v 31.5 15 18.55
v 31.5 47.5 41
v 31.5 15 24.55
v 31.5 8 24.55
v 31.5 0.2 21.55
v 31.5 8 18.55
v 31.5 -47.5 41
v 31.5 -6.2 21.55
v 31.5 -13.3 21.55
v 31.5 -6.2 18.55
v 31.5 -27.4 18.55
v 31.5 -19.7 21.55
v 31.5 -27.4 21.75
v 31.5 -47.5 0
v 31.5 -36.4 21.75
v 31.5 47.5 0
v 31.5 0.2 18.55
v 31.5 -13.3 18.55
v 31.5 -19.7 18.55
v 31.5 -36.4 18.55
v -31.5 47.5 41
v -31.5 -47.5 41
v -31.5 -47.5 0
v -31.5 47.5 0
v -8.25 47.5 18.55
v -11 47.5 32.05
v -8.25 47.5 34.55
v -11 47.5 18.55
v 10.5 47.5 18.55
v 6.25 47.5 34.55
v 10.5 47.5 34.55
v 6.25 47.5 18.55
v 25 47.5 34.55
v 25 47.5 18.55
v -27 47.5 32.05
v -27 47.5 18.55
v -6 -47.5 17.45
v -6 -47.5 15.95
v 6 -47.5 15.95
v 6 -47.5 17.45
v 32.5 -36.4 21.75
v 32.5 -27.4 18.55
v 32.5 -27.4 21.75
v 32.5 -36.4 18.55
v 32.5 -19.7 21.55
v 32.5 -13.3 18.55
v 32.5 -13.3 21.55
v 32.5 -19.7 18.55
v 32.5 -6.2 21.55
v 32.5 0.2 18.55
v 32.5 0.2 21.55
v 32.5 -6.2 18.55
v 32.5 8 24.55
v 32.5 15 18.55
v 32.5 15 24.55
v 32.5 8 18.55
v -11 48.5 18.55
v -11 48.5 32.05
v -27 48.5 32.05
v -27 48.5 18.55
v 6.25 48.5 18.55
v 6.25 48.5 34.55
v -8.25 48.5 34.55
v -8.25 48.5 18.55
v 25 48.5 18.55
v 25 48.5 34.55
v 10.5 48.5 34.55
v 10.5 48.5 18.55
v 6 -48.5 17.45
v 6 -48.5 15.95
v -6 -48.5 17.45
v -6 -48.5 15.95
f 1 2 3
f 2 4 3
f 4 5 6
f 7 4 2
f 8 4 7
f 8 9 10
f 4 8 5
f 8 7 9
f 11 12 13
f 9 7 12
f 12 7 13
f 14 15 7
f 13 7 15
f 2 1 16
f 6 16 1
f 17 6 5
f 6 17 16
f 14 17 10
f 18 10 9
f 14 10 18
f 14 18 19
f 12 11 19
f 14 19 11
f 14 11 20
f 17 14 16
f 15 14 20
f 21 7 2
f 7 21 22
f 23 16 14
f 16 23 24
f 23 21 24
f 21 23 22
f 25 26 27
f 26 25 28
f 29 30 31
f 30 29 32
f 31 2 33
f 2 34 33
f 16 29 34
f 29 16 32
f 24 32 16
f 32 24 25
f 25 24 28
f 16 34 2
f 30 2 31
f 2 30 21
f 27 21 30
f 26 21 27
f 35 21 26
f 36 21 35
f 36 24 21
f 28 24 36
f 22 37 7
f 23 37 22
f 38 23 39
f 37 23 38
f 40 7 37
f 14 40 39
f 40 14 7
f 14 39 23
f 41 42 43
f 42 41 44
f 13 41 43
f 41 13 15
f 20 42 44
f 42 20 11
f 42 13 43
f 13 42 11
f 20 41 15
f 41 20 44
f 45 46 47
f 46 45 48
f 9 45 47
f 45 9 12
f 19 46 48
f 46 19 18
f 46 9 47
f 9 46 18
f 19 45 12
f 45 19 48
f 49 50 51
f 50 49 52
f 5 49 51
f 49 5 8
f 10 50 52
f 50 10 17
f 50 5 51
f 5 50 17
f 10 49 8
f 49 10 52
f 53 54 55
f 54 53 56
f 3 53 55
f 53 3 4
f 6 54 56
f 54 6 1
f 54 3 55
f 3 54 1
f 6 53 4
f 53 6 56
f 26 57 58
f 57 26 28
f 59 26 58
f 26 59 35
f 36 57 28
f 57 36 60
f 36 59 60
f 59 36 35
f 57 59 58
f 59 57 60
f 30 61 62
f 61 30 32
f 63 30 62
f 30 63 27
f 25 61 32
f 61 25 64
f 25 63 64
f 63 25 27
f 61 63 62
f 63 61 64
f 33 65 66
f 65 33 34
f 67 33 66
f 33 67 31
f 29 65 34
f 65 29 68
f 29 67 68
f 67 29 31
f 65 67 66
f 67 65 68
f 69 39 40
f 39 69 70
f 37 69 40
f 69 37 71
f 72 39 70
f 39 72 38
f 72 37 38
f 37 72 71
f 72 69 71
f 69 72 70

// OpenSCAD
module raspi_ssd() {
    translate([0,0,37.5]) {
        // Base volume (rounded corners, r=10)
        color("darkgray")
        cube([94,114,69], center=true);

        // Front Panel I/O
        color("green")
        translate([-94/2 - 0.5, 36.43, 12.47])
            rotate([0, 90, 0])
            cylinder(h=1, d=20, center=true, $fn=32);

        // Back Panel I/O
        color("blue")
        translate([94/2 + 0.5, -45.23, 8.76])
            cube([1, 11.91, 13.48], center=true);
            
        color("blue")
        translate([94/2 + 0.5, -29.31, 8.76])
            cube([1, 11.91, 13.48], center=true);

        color("blue")
        translate([94/2 + 0.5, -29.31, -7.44])
            cube([1, 11.91, 7.69], center=true);

        color("blue")
        translate([94/2 + 0.5, -11.96, 7.47])
            cube([1, 14.98, 13.70], center=true);

        // Right Side Panel I/O (Y = -114/2)
        color("red")
        translate([-33.03, -114/2 - 0.5, 2.52])
            cube([9.43, 1, 4.72], center=true);

        color("red")
        translate([-17.97, -114/2 - 0.5, 2.52])
            cube([7.91, 1, 4.72], center=true);

        color("red")
        translate([-4.42, -114/2 - 0.5, 2.52])
            cube([7.91, 1, 4.72], center=true);

        color("red")
        translate([6.84, -114/2 - 0.5, 16.82])
            cube([9.43, 1, 4.72], center=true);

        color("red")
        translate([-11.88, -114/2 - 0.5, 16.82])
            cube([9.43, 1, 4.72], center=true);

        color("red")
        translate([-30.44, -114/2 - 0.5, 22.07])
            rotate([90, 0, 0])
            cylinder(h=1, d=10.34, center=true, $fn=32);

        color("red")
        translate([11.71, -114/2 - 0.5, 3.97])
            rotate([90, 0, 0])
            cylinder(h=1, d=5.78, center=true, $fn=32);

        // 4x Bottom Pads
        // d=20mm, 4mm from edges (14mm to center)
        color("darkgray")
        for (dx = [-1, 1], dy = [-1, 1]) {
            translate([dx * (94/2 - 14), dy * (114/2 - 14), -69/2 - 1.5])
                cylinder(h=3, d=20, center=true, $fn=32);
        }
    }
}

module raspi_ssd_2() {
    translate([0,0,20.5]) {
        // Base volume (rounded corners, r=10)
        color("darkgray")
        cube([63,95,41], center=true);
    }

    // Z-height of the Raspberry Pi PCB inside the case
    // Adjust this value to move all the ports up or down
    pi_z = 18;
    
    // Back Panel I/O (X = 63/2)
    // Power (USB-C)
    color("silver")
    translate([63/2 + 0.5, -31.9, pi_z + 2.15])
        cube([1, 9.0, 3.2], center=true);

    // Micro HDMI 0
    color("silver")
    translate([63/2 + 0.5, -16.5, pi_z + 2.05])
        cube([1, 6.4, 3.0], center=true);

    // Micro HDMI 1
    color("silver")
    translate([63/2 + 0.5, -3.0, pi_z + 2.05])
        cube([1, 6.4, 3.0], center=true);

    // 3.5mm Audio
    color("black")
    translate([63/2 + 0.5, 11.5, pi_z + 3.55])
        cube([1, 7.0, 6.0], center=true);

    // Right Side Panel I/O (Y = 95/2)
    // Ethernet
    color("silver")
    translate([-19.0, 95/2 + 0.5, pi_z + 7.3])
        cube([16.0, 1, 13.5], center=true);

    // USB 1
    color("silver")
    translate([-1.0, 95/2 + 0.5, pi_z + 8.55])
        cube([14.5, 1, 16.0], center=true);

    // USB 2
    color("silver")
    translate([17.75, 95/2 + 0.5, pi_z + 8.55])
        cube([14.5, 1, 16.0], center=true);

    // Left Side Panel I/O (Y = -95/2)
    // MicroSD
    color("darkgray")
    translate([0, -95/2 - 0.5, pi_z - 1.3])
        cube([12.0, 1, 1.5], center=true);
}


raspi_ssd_2();
